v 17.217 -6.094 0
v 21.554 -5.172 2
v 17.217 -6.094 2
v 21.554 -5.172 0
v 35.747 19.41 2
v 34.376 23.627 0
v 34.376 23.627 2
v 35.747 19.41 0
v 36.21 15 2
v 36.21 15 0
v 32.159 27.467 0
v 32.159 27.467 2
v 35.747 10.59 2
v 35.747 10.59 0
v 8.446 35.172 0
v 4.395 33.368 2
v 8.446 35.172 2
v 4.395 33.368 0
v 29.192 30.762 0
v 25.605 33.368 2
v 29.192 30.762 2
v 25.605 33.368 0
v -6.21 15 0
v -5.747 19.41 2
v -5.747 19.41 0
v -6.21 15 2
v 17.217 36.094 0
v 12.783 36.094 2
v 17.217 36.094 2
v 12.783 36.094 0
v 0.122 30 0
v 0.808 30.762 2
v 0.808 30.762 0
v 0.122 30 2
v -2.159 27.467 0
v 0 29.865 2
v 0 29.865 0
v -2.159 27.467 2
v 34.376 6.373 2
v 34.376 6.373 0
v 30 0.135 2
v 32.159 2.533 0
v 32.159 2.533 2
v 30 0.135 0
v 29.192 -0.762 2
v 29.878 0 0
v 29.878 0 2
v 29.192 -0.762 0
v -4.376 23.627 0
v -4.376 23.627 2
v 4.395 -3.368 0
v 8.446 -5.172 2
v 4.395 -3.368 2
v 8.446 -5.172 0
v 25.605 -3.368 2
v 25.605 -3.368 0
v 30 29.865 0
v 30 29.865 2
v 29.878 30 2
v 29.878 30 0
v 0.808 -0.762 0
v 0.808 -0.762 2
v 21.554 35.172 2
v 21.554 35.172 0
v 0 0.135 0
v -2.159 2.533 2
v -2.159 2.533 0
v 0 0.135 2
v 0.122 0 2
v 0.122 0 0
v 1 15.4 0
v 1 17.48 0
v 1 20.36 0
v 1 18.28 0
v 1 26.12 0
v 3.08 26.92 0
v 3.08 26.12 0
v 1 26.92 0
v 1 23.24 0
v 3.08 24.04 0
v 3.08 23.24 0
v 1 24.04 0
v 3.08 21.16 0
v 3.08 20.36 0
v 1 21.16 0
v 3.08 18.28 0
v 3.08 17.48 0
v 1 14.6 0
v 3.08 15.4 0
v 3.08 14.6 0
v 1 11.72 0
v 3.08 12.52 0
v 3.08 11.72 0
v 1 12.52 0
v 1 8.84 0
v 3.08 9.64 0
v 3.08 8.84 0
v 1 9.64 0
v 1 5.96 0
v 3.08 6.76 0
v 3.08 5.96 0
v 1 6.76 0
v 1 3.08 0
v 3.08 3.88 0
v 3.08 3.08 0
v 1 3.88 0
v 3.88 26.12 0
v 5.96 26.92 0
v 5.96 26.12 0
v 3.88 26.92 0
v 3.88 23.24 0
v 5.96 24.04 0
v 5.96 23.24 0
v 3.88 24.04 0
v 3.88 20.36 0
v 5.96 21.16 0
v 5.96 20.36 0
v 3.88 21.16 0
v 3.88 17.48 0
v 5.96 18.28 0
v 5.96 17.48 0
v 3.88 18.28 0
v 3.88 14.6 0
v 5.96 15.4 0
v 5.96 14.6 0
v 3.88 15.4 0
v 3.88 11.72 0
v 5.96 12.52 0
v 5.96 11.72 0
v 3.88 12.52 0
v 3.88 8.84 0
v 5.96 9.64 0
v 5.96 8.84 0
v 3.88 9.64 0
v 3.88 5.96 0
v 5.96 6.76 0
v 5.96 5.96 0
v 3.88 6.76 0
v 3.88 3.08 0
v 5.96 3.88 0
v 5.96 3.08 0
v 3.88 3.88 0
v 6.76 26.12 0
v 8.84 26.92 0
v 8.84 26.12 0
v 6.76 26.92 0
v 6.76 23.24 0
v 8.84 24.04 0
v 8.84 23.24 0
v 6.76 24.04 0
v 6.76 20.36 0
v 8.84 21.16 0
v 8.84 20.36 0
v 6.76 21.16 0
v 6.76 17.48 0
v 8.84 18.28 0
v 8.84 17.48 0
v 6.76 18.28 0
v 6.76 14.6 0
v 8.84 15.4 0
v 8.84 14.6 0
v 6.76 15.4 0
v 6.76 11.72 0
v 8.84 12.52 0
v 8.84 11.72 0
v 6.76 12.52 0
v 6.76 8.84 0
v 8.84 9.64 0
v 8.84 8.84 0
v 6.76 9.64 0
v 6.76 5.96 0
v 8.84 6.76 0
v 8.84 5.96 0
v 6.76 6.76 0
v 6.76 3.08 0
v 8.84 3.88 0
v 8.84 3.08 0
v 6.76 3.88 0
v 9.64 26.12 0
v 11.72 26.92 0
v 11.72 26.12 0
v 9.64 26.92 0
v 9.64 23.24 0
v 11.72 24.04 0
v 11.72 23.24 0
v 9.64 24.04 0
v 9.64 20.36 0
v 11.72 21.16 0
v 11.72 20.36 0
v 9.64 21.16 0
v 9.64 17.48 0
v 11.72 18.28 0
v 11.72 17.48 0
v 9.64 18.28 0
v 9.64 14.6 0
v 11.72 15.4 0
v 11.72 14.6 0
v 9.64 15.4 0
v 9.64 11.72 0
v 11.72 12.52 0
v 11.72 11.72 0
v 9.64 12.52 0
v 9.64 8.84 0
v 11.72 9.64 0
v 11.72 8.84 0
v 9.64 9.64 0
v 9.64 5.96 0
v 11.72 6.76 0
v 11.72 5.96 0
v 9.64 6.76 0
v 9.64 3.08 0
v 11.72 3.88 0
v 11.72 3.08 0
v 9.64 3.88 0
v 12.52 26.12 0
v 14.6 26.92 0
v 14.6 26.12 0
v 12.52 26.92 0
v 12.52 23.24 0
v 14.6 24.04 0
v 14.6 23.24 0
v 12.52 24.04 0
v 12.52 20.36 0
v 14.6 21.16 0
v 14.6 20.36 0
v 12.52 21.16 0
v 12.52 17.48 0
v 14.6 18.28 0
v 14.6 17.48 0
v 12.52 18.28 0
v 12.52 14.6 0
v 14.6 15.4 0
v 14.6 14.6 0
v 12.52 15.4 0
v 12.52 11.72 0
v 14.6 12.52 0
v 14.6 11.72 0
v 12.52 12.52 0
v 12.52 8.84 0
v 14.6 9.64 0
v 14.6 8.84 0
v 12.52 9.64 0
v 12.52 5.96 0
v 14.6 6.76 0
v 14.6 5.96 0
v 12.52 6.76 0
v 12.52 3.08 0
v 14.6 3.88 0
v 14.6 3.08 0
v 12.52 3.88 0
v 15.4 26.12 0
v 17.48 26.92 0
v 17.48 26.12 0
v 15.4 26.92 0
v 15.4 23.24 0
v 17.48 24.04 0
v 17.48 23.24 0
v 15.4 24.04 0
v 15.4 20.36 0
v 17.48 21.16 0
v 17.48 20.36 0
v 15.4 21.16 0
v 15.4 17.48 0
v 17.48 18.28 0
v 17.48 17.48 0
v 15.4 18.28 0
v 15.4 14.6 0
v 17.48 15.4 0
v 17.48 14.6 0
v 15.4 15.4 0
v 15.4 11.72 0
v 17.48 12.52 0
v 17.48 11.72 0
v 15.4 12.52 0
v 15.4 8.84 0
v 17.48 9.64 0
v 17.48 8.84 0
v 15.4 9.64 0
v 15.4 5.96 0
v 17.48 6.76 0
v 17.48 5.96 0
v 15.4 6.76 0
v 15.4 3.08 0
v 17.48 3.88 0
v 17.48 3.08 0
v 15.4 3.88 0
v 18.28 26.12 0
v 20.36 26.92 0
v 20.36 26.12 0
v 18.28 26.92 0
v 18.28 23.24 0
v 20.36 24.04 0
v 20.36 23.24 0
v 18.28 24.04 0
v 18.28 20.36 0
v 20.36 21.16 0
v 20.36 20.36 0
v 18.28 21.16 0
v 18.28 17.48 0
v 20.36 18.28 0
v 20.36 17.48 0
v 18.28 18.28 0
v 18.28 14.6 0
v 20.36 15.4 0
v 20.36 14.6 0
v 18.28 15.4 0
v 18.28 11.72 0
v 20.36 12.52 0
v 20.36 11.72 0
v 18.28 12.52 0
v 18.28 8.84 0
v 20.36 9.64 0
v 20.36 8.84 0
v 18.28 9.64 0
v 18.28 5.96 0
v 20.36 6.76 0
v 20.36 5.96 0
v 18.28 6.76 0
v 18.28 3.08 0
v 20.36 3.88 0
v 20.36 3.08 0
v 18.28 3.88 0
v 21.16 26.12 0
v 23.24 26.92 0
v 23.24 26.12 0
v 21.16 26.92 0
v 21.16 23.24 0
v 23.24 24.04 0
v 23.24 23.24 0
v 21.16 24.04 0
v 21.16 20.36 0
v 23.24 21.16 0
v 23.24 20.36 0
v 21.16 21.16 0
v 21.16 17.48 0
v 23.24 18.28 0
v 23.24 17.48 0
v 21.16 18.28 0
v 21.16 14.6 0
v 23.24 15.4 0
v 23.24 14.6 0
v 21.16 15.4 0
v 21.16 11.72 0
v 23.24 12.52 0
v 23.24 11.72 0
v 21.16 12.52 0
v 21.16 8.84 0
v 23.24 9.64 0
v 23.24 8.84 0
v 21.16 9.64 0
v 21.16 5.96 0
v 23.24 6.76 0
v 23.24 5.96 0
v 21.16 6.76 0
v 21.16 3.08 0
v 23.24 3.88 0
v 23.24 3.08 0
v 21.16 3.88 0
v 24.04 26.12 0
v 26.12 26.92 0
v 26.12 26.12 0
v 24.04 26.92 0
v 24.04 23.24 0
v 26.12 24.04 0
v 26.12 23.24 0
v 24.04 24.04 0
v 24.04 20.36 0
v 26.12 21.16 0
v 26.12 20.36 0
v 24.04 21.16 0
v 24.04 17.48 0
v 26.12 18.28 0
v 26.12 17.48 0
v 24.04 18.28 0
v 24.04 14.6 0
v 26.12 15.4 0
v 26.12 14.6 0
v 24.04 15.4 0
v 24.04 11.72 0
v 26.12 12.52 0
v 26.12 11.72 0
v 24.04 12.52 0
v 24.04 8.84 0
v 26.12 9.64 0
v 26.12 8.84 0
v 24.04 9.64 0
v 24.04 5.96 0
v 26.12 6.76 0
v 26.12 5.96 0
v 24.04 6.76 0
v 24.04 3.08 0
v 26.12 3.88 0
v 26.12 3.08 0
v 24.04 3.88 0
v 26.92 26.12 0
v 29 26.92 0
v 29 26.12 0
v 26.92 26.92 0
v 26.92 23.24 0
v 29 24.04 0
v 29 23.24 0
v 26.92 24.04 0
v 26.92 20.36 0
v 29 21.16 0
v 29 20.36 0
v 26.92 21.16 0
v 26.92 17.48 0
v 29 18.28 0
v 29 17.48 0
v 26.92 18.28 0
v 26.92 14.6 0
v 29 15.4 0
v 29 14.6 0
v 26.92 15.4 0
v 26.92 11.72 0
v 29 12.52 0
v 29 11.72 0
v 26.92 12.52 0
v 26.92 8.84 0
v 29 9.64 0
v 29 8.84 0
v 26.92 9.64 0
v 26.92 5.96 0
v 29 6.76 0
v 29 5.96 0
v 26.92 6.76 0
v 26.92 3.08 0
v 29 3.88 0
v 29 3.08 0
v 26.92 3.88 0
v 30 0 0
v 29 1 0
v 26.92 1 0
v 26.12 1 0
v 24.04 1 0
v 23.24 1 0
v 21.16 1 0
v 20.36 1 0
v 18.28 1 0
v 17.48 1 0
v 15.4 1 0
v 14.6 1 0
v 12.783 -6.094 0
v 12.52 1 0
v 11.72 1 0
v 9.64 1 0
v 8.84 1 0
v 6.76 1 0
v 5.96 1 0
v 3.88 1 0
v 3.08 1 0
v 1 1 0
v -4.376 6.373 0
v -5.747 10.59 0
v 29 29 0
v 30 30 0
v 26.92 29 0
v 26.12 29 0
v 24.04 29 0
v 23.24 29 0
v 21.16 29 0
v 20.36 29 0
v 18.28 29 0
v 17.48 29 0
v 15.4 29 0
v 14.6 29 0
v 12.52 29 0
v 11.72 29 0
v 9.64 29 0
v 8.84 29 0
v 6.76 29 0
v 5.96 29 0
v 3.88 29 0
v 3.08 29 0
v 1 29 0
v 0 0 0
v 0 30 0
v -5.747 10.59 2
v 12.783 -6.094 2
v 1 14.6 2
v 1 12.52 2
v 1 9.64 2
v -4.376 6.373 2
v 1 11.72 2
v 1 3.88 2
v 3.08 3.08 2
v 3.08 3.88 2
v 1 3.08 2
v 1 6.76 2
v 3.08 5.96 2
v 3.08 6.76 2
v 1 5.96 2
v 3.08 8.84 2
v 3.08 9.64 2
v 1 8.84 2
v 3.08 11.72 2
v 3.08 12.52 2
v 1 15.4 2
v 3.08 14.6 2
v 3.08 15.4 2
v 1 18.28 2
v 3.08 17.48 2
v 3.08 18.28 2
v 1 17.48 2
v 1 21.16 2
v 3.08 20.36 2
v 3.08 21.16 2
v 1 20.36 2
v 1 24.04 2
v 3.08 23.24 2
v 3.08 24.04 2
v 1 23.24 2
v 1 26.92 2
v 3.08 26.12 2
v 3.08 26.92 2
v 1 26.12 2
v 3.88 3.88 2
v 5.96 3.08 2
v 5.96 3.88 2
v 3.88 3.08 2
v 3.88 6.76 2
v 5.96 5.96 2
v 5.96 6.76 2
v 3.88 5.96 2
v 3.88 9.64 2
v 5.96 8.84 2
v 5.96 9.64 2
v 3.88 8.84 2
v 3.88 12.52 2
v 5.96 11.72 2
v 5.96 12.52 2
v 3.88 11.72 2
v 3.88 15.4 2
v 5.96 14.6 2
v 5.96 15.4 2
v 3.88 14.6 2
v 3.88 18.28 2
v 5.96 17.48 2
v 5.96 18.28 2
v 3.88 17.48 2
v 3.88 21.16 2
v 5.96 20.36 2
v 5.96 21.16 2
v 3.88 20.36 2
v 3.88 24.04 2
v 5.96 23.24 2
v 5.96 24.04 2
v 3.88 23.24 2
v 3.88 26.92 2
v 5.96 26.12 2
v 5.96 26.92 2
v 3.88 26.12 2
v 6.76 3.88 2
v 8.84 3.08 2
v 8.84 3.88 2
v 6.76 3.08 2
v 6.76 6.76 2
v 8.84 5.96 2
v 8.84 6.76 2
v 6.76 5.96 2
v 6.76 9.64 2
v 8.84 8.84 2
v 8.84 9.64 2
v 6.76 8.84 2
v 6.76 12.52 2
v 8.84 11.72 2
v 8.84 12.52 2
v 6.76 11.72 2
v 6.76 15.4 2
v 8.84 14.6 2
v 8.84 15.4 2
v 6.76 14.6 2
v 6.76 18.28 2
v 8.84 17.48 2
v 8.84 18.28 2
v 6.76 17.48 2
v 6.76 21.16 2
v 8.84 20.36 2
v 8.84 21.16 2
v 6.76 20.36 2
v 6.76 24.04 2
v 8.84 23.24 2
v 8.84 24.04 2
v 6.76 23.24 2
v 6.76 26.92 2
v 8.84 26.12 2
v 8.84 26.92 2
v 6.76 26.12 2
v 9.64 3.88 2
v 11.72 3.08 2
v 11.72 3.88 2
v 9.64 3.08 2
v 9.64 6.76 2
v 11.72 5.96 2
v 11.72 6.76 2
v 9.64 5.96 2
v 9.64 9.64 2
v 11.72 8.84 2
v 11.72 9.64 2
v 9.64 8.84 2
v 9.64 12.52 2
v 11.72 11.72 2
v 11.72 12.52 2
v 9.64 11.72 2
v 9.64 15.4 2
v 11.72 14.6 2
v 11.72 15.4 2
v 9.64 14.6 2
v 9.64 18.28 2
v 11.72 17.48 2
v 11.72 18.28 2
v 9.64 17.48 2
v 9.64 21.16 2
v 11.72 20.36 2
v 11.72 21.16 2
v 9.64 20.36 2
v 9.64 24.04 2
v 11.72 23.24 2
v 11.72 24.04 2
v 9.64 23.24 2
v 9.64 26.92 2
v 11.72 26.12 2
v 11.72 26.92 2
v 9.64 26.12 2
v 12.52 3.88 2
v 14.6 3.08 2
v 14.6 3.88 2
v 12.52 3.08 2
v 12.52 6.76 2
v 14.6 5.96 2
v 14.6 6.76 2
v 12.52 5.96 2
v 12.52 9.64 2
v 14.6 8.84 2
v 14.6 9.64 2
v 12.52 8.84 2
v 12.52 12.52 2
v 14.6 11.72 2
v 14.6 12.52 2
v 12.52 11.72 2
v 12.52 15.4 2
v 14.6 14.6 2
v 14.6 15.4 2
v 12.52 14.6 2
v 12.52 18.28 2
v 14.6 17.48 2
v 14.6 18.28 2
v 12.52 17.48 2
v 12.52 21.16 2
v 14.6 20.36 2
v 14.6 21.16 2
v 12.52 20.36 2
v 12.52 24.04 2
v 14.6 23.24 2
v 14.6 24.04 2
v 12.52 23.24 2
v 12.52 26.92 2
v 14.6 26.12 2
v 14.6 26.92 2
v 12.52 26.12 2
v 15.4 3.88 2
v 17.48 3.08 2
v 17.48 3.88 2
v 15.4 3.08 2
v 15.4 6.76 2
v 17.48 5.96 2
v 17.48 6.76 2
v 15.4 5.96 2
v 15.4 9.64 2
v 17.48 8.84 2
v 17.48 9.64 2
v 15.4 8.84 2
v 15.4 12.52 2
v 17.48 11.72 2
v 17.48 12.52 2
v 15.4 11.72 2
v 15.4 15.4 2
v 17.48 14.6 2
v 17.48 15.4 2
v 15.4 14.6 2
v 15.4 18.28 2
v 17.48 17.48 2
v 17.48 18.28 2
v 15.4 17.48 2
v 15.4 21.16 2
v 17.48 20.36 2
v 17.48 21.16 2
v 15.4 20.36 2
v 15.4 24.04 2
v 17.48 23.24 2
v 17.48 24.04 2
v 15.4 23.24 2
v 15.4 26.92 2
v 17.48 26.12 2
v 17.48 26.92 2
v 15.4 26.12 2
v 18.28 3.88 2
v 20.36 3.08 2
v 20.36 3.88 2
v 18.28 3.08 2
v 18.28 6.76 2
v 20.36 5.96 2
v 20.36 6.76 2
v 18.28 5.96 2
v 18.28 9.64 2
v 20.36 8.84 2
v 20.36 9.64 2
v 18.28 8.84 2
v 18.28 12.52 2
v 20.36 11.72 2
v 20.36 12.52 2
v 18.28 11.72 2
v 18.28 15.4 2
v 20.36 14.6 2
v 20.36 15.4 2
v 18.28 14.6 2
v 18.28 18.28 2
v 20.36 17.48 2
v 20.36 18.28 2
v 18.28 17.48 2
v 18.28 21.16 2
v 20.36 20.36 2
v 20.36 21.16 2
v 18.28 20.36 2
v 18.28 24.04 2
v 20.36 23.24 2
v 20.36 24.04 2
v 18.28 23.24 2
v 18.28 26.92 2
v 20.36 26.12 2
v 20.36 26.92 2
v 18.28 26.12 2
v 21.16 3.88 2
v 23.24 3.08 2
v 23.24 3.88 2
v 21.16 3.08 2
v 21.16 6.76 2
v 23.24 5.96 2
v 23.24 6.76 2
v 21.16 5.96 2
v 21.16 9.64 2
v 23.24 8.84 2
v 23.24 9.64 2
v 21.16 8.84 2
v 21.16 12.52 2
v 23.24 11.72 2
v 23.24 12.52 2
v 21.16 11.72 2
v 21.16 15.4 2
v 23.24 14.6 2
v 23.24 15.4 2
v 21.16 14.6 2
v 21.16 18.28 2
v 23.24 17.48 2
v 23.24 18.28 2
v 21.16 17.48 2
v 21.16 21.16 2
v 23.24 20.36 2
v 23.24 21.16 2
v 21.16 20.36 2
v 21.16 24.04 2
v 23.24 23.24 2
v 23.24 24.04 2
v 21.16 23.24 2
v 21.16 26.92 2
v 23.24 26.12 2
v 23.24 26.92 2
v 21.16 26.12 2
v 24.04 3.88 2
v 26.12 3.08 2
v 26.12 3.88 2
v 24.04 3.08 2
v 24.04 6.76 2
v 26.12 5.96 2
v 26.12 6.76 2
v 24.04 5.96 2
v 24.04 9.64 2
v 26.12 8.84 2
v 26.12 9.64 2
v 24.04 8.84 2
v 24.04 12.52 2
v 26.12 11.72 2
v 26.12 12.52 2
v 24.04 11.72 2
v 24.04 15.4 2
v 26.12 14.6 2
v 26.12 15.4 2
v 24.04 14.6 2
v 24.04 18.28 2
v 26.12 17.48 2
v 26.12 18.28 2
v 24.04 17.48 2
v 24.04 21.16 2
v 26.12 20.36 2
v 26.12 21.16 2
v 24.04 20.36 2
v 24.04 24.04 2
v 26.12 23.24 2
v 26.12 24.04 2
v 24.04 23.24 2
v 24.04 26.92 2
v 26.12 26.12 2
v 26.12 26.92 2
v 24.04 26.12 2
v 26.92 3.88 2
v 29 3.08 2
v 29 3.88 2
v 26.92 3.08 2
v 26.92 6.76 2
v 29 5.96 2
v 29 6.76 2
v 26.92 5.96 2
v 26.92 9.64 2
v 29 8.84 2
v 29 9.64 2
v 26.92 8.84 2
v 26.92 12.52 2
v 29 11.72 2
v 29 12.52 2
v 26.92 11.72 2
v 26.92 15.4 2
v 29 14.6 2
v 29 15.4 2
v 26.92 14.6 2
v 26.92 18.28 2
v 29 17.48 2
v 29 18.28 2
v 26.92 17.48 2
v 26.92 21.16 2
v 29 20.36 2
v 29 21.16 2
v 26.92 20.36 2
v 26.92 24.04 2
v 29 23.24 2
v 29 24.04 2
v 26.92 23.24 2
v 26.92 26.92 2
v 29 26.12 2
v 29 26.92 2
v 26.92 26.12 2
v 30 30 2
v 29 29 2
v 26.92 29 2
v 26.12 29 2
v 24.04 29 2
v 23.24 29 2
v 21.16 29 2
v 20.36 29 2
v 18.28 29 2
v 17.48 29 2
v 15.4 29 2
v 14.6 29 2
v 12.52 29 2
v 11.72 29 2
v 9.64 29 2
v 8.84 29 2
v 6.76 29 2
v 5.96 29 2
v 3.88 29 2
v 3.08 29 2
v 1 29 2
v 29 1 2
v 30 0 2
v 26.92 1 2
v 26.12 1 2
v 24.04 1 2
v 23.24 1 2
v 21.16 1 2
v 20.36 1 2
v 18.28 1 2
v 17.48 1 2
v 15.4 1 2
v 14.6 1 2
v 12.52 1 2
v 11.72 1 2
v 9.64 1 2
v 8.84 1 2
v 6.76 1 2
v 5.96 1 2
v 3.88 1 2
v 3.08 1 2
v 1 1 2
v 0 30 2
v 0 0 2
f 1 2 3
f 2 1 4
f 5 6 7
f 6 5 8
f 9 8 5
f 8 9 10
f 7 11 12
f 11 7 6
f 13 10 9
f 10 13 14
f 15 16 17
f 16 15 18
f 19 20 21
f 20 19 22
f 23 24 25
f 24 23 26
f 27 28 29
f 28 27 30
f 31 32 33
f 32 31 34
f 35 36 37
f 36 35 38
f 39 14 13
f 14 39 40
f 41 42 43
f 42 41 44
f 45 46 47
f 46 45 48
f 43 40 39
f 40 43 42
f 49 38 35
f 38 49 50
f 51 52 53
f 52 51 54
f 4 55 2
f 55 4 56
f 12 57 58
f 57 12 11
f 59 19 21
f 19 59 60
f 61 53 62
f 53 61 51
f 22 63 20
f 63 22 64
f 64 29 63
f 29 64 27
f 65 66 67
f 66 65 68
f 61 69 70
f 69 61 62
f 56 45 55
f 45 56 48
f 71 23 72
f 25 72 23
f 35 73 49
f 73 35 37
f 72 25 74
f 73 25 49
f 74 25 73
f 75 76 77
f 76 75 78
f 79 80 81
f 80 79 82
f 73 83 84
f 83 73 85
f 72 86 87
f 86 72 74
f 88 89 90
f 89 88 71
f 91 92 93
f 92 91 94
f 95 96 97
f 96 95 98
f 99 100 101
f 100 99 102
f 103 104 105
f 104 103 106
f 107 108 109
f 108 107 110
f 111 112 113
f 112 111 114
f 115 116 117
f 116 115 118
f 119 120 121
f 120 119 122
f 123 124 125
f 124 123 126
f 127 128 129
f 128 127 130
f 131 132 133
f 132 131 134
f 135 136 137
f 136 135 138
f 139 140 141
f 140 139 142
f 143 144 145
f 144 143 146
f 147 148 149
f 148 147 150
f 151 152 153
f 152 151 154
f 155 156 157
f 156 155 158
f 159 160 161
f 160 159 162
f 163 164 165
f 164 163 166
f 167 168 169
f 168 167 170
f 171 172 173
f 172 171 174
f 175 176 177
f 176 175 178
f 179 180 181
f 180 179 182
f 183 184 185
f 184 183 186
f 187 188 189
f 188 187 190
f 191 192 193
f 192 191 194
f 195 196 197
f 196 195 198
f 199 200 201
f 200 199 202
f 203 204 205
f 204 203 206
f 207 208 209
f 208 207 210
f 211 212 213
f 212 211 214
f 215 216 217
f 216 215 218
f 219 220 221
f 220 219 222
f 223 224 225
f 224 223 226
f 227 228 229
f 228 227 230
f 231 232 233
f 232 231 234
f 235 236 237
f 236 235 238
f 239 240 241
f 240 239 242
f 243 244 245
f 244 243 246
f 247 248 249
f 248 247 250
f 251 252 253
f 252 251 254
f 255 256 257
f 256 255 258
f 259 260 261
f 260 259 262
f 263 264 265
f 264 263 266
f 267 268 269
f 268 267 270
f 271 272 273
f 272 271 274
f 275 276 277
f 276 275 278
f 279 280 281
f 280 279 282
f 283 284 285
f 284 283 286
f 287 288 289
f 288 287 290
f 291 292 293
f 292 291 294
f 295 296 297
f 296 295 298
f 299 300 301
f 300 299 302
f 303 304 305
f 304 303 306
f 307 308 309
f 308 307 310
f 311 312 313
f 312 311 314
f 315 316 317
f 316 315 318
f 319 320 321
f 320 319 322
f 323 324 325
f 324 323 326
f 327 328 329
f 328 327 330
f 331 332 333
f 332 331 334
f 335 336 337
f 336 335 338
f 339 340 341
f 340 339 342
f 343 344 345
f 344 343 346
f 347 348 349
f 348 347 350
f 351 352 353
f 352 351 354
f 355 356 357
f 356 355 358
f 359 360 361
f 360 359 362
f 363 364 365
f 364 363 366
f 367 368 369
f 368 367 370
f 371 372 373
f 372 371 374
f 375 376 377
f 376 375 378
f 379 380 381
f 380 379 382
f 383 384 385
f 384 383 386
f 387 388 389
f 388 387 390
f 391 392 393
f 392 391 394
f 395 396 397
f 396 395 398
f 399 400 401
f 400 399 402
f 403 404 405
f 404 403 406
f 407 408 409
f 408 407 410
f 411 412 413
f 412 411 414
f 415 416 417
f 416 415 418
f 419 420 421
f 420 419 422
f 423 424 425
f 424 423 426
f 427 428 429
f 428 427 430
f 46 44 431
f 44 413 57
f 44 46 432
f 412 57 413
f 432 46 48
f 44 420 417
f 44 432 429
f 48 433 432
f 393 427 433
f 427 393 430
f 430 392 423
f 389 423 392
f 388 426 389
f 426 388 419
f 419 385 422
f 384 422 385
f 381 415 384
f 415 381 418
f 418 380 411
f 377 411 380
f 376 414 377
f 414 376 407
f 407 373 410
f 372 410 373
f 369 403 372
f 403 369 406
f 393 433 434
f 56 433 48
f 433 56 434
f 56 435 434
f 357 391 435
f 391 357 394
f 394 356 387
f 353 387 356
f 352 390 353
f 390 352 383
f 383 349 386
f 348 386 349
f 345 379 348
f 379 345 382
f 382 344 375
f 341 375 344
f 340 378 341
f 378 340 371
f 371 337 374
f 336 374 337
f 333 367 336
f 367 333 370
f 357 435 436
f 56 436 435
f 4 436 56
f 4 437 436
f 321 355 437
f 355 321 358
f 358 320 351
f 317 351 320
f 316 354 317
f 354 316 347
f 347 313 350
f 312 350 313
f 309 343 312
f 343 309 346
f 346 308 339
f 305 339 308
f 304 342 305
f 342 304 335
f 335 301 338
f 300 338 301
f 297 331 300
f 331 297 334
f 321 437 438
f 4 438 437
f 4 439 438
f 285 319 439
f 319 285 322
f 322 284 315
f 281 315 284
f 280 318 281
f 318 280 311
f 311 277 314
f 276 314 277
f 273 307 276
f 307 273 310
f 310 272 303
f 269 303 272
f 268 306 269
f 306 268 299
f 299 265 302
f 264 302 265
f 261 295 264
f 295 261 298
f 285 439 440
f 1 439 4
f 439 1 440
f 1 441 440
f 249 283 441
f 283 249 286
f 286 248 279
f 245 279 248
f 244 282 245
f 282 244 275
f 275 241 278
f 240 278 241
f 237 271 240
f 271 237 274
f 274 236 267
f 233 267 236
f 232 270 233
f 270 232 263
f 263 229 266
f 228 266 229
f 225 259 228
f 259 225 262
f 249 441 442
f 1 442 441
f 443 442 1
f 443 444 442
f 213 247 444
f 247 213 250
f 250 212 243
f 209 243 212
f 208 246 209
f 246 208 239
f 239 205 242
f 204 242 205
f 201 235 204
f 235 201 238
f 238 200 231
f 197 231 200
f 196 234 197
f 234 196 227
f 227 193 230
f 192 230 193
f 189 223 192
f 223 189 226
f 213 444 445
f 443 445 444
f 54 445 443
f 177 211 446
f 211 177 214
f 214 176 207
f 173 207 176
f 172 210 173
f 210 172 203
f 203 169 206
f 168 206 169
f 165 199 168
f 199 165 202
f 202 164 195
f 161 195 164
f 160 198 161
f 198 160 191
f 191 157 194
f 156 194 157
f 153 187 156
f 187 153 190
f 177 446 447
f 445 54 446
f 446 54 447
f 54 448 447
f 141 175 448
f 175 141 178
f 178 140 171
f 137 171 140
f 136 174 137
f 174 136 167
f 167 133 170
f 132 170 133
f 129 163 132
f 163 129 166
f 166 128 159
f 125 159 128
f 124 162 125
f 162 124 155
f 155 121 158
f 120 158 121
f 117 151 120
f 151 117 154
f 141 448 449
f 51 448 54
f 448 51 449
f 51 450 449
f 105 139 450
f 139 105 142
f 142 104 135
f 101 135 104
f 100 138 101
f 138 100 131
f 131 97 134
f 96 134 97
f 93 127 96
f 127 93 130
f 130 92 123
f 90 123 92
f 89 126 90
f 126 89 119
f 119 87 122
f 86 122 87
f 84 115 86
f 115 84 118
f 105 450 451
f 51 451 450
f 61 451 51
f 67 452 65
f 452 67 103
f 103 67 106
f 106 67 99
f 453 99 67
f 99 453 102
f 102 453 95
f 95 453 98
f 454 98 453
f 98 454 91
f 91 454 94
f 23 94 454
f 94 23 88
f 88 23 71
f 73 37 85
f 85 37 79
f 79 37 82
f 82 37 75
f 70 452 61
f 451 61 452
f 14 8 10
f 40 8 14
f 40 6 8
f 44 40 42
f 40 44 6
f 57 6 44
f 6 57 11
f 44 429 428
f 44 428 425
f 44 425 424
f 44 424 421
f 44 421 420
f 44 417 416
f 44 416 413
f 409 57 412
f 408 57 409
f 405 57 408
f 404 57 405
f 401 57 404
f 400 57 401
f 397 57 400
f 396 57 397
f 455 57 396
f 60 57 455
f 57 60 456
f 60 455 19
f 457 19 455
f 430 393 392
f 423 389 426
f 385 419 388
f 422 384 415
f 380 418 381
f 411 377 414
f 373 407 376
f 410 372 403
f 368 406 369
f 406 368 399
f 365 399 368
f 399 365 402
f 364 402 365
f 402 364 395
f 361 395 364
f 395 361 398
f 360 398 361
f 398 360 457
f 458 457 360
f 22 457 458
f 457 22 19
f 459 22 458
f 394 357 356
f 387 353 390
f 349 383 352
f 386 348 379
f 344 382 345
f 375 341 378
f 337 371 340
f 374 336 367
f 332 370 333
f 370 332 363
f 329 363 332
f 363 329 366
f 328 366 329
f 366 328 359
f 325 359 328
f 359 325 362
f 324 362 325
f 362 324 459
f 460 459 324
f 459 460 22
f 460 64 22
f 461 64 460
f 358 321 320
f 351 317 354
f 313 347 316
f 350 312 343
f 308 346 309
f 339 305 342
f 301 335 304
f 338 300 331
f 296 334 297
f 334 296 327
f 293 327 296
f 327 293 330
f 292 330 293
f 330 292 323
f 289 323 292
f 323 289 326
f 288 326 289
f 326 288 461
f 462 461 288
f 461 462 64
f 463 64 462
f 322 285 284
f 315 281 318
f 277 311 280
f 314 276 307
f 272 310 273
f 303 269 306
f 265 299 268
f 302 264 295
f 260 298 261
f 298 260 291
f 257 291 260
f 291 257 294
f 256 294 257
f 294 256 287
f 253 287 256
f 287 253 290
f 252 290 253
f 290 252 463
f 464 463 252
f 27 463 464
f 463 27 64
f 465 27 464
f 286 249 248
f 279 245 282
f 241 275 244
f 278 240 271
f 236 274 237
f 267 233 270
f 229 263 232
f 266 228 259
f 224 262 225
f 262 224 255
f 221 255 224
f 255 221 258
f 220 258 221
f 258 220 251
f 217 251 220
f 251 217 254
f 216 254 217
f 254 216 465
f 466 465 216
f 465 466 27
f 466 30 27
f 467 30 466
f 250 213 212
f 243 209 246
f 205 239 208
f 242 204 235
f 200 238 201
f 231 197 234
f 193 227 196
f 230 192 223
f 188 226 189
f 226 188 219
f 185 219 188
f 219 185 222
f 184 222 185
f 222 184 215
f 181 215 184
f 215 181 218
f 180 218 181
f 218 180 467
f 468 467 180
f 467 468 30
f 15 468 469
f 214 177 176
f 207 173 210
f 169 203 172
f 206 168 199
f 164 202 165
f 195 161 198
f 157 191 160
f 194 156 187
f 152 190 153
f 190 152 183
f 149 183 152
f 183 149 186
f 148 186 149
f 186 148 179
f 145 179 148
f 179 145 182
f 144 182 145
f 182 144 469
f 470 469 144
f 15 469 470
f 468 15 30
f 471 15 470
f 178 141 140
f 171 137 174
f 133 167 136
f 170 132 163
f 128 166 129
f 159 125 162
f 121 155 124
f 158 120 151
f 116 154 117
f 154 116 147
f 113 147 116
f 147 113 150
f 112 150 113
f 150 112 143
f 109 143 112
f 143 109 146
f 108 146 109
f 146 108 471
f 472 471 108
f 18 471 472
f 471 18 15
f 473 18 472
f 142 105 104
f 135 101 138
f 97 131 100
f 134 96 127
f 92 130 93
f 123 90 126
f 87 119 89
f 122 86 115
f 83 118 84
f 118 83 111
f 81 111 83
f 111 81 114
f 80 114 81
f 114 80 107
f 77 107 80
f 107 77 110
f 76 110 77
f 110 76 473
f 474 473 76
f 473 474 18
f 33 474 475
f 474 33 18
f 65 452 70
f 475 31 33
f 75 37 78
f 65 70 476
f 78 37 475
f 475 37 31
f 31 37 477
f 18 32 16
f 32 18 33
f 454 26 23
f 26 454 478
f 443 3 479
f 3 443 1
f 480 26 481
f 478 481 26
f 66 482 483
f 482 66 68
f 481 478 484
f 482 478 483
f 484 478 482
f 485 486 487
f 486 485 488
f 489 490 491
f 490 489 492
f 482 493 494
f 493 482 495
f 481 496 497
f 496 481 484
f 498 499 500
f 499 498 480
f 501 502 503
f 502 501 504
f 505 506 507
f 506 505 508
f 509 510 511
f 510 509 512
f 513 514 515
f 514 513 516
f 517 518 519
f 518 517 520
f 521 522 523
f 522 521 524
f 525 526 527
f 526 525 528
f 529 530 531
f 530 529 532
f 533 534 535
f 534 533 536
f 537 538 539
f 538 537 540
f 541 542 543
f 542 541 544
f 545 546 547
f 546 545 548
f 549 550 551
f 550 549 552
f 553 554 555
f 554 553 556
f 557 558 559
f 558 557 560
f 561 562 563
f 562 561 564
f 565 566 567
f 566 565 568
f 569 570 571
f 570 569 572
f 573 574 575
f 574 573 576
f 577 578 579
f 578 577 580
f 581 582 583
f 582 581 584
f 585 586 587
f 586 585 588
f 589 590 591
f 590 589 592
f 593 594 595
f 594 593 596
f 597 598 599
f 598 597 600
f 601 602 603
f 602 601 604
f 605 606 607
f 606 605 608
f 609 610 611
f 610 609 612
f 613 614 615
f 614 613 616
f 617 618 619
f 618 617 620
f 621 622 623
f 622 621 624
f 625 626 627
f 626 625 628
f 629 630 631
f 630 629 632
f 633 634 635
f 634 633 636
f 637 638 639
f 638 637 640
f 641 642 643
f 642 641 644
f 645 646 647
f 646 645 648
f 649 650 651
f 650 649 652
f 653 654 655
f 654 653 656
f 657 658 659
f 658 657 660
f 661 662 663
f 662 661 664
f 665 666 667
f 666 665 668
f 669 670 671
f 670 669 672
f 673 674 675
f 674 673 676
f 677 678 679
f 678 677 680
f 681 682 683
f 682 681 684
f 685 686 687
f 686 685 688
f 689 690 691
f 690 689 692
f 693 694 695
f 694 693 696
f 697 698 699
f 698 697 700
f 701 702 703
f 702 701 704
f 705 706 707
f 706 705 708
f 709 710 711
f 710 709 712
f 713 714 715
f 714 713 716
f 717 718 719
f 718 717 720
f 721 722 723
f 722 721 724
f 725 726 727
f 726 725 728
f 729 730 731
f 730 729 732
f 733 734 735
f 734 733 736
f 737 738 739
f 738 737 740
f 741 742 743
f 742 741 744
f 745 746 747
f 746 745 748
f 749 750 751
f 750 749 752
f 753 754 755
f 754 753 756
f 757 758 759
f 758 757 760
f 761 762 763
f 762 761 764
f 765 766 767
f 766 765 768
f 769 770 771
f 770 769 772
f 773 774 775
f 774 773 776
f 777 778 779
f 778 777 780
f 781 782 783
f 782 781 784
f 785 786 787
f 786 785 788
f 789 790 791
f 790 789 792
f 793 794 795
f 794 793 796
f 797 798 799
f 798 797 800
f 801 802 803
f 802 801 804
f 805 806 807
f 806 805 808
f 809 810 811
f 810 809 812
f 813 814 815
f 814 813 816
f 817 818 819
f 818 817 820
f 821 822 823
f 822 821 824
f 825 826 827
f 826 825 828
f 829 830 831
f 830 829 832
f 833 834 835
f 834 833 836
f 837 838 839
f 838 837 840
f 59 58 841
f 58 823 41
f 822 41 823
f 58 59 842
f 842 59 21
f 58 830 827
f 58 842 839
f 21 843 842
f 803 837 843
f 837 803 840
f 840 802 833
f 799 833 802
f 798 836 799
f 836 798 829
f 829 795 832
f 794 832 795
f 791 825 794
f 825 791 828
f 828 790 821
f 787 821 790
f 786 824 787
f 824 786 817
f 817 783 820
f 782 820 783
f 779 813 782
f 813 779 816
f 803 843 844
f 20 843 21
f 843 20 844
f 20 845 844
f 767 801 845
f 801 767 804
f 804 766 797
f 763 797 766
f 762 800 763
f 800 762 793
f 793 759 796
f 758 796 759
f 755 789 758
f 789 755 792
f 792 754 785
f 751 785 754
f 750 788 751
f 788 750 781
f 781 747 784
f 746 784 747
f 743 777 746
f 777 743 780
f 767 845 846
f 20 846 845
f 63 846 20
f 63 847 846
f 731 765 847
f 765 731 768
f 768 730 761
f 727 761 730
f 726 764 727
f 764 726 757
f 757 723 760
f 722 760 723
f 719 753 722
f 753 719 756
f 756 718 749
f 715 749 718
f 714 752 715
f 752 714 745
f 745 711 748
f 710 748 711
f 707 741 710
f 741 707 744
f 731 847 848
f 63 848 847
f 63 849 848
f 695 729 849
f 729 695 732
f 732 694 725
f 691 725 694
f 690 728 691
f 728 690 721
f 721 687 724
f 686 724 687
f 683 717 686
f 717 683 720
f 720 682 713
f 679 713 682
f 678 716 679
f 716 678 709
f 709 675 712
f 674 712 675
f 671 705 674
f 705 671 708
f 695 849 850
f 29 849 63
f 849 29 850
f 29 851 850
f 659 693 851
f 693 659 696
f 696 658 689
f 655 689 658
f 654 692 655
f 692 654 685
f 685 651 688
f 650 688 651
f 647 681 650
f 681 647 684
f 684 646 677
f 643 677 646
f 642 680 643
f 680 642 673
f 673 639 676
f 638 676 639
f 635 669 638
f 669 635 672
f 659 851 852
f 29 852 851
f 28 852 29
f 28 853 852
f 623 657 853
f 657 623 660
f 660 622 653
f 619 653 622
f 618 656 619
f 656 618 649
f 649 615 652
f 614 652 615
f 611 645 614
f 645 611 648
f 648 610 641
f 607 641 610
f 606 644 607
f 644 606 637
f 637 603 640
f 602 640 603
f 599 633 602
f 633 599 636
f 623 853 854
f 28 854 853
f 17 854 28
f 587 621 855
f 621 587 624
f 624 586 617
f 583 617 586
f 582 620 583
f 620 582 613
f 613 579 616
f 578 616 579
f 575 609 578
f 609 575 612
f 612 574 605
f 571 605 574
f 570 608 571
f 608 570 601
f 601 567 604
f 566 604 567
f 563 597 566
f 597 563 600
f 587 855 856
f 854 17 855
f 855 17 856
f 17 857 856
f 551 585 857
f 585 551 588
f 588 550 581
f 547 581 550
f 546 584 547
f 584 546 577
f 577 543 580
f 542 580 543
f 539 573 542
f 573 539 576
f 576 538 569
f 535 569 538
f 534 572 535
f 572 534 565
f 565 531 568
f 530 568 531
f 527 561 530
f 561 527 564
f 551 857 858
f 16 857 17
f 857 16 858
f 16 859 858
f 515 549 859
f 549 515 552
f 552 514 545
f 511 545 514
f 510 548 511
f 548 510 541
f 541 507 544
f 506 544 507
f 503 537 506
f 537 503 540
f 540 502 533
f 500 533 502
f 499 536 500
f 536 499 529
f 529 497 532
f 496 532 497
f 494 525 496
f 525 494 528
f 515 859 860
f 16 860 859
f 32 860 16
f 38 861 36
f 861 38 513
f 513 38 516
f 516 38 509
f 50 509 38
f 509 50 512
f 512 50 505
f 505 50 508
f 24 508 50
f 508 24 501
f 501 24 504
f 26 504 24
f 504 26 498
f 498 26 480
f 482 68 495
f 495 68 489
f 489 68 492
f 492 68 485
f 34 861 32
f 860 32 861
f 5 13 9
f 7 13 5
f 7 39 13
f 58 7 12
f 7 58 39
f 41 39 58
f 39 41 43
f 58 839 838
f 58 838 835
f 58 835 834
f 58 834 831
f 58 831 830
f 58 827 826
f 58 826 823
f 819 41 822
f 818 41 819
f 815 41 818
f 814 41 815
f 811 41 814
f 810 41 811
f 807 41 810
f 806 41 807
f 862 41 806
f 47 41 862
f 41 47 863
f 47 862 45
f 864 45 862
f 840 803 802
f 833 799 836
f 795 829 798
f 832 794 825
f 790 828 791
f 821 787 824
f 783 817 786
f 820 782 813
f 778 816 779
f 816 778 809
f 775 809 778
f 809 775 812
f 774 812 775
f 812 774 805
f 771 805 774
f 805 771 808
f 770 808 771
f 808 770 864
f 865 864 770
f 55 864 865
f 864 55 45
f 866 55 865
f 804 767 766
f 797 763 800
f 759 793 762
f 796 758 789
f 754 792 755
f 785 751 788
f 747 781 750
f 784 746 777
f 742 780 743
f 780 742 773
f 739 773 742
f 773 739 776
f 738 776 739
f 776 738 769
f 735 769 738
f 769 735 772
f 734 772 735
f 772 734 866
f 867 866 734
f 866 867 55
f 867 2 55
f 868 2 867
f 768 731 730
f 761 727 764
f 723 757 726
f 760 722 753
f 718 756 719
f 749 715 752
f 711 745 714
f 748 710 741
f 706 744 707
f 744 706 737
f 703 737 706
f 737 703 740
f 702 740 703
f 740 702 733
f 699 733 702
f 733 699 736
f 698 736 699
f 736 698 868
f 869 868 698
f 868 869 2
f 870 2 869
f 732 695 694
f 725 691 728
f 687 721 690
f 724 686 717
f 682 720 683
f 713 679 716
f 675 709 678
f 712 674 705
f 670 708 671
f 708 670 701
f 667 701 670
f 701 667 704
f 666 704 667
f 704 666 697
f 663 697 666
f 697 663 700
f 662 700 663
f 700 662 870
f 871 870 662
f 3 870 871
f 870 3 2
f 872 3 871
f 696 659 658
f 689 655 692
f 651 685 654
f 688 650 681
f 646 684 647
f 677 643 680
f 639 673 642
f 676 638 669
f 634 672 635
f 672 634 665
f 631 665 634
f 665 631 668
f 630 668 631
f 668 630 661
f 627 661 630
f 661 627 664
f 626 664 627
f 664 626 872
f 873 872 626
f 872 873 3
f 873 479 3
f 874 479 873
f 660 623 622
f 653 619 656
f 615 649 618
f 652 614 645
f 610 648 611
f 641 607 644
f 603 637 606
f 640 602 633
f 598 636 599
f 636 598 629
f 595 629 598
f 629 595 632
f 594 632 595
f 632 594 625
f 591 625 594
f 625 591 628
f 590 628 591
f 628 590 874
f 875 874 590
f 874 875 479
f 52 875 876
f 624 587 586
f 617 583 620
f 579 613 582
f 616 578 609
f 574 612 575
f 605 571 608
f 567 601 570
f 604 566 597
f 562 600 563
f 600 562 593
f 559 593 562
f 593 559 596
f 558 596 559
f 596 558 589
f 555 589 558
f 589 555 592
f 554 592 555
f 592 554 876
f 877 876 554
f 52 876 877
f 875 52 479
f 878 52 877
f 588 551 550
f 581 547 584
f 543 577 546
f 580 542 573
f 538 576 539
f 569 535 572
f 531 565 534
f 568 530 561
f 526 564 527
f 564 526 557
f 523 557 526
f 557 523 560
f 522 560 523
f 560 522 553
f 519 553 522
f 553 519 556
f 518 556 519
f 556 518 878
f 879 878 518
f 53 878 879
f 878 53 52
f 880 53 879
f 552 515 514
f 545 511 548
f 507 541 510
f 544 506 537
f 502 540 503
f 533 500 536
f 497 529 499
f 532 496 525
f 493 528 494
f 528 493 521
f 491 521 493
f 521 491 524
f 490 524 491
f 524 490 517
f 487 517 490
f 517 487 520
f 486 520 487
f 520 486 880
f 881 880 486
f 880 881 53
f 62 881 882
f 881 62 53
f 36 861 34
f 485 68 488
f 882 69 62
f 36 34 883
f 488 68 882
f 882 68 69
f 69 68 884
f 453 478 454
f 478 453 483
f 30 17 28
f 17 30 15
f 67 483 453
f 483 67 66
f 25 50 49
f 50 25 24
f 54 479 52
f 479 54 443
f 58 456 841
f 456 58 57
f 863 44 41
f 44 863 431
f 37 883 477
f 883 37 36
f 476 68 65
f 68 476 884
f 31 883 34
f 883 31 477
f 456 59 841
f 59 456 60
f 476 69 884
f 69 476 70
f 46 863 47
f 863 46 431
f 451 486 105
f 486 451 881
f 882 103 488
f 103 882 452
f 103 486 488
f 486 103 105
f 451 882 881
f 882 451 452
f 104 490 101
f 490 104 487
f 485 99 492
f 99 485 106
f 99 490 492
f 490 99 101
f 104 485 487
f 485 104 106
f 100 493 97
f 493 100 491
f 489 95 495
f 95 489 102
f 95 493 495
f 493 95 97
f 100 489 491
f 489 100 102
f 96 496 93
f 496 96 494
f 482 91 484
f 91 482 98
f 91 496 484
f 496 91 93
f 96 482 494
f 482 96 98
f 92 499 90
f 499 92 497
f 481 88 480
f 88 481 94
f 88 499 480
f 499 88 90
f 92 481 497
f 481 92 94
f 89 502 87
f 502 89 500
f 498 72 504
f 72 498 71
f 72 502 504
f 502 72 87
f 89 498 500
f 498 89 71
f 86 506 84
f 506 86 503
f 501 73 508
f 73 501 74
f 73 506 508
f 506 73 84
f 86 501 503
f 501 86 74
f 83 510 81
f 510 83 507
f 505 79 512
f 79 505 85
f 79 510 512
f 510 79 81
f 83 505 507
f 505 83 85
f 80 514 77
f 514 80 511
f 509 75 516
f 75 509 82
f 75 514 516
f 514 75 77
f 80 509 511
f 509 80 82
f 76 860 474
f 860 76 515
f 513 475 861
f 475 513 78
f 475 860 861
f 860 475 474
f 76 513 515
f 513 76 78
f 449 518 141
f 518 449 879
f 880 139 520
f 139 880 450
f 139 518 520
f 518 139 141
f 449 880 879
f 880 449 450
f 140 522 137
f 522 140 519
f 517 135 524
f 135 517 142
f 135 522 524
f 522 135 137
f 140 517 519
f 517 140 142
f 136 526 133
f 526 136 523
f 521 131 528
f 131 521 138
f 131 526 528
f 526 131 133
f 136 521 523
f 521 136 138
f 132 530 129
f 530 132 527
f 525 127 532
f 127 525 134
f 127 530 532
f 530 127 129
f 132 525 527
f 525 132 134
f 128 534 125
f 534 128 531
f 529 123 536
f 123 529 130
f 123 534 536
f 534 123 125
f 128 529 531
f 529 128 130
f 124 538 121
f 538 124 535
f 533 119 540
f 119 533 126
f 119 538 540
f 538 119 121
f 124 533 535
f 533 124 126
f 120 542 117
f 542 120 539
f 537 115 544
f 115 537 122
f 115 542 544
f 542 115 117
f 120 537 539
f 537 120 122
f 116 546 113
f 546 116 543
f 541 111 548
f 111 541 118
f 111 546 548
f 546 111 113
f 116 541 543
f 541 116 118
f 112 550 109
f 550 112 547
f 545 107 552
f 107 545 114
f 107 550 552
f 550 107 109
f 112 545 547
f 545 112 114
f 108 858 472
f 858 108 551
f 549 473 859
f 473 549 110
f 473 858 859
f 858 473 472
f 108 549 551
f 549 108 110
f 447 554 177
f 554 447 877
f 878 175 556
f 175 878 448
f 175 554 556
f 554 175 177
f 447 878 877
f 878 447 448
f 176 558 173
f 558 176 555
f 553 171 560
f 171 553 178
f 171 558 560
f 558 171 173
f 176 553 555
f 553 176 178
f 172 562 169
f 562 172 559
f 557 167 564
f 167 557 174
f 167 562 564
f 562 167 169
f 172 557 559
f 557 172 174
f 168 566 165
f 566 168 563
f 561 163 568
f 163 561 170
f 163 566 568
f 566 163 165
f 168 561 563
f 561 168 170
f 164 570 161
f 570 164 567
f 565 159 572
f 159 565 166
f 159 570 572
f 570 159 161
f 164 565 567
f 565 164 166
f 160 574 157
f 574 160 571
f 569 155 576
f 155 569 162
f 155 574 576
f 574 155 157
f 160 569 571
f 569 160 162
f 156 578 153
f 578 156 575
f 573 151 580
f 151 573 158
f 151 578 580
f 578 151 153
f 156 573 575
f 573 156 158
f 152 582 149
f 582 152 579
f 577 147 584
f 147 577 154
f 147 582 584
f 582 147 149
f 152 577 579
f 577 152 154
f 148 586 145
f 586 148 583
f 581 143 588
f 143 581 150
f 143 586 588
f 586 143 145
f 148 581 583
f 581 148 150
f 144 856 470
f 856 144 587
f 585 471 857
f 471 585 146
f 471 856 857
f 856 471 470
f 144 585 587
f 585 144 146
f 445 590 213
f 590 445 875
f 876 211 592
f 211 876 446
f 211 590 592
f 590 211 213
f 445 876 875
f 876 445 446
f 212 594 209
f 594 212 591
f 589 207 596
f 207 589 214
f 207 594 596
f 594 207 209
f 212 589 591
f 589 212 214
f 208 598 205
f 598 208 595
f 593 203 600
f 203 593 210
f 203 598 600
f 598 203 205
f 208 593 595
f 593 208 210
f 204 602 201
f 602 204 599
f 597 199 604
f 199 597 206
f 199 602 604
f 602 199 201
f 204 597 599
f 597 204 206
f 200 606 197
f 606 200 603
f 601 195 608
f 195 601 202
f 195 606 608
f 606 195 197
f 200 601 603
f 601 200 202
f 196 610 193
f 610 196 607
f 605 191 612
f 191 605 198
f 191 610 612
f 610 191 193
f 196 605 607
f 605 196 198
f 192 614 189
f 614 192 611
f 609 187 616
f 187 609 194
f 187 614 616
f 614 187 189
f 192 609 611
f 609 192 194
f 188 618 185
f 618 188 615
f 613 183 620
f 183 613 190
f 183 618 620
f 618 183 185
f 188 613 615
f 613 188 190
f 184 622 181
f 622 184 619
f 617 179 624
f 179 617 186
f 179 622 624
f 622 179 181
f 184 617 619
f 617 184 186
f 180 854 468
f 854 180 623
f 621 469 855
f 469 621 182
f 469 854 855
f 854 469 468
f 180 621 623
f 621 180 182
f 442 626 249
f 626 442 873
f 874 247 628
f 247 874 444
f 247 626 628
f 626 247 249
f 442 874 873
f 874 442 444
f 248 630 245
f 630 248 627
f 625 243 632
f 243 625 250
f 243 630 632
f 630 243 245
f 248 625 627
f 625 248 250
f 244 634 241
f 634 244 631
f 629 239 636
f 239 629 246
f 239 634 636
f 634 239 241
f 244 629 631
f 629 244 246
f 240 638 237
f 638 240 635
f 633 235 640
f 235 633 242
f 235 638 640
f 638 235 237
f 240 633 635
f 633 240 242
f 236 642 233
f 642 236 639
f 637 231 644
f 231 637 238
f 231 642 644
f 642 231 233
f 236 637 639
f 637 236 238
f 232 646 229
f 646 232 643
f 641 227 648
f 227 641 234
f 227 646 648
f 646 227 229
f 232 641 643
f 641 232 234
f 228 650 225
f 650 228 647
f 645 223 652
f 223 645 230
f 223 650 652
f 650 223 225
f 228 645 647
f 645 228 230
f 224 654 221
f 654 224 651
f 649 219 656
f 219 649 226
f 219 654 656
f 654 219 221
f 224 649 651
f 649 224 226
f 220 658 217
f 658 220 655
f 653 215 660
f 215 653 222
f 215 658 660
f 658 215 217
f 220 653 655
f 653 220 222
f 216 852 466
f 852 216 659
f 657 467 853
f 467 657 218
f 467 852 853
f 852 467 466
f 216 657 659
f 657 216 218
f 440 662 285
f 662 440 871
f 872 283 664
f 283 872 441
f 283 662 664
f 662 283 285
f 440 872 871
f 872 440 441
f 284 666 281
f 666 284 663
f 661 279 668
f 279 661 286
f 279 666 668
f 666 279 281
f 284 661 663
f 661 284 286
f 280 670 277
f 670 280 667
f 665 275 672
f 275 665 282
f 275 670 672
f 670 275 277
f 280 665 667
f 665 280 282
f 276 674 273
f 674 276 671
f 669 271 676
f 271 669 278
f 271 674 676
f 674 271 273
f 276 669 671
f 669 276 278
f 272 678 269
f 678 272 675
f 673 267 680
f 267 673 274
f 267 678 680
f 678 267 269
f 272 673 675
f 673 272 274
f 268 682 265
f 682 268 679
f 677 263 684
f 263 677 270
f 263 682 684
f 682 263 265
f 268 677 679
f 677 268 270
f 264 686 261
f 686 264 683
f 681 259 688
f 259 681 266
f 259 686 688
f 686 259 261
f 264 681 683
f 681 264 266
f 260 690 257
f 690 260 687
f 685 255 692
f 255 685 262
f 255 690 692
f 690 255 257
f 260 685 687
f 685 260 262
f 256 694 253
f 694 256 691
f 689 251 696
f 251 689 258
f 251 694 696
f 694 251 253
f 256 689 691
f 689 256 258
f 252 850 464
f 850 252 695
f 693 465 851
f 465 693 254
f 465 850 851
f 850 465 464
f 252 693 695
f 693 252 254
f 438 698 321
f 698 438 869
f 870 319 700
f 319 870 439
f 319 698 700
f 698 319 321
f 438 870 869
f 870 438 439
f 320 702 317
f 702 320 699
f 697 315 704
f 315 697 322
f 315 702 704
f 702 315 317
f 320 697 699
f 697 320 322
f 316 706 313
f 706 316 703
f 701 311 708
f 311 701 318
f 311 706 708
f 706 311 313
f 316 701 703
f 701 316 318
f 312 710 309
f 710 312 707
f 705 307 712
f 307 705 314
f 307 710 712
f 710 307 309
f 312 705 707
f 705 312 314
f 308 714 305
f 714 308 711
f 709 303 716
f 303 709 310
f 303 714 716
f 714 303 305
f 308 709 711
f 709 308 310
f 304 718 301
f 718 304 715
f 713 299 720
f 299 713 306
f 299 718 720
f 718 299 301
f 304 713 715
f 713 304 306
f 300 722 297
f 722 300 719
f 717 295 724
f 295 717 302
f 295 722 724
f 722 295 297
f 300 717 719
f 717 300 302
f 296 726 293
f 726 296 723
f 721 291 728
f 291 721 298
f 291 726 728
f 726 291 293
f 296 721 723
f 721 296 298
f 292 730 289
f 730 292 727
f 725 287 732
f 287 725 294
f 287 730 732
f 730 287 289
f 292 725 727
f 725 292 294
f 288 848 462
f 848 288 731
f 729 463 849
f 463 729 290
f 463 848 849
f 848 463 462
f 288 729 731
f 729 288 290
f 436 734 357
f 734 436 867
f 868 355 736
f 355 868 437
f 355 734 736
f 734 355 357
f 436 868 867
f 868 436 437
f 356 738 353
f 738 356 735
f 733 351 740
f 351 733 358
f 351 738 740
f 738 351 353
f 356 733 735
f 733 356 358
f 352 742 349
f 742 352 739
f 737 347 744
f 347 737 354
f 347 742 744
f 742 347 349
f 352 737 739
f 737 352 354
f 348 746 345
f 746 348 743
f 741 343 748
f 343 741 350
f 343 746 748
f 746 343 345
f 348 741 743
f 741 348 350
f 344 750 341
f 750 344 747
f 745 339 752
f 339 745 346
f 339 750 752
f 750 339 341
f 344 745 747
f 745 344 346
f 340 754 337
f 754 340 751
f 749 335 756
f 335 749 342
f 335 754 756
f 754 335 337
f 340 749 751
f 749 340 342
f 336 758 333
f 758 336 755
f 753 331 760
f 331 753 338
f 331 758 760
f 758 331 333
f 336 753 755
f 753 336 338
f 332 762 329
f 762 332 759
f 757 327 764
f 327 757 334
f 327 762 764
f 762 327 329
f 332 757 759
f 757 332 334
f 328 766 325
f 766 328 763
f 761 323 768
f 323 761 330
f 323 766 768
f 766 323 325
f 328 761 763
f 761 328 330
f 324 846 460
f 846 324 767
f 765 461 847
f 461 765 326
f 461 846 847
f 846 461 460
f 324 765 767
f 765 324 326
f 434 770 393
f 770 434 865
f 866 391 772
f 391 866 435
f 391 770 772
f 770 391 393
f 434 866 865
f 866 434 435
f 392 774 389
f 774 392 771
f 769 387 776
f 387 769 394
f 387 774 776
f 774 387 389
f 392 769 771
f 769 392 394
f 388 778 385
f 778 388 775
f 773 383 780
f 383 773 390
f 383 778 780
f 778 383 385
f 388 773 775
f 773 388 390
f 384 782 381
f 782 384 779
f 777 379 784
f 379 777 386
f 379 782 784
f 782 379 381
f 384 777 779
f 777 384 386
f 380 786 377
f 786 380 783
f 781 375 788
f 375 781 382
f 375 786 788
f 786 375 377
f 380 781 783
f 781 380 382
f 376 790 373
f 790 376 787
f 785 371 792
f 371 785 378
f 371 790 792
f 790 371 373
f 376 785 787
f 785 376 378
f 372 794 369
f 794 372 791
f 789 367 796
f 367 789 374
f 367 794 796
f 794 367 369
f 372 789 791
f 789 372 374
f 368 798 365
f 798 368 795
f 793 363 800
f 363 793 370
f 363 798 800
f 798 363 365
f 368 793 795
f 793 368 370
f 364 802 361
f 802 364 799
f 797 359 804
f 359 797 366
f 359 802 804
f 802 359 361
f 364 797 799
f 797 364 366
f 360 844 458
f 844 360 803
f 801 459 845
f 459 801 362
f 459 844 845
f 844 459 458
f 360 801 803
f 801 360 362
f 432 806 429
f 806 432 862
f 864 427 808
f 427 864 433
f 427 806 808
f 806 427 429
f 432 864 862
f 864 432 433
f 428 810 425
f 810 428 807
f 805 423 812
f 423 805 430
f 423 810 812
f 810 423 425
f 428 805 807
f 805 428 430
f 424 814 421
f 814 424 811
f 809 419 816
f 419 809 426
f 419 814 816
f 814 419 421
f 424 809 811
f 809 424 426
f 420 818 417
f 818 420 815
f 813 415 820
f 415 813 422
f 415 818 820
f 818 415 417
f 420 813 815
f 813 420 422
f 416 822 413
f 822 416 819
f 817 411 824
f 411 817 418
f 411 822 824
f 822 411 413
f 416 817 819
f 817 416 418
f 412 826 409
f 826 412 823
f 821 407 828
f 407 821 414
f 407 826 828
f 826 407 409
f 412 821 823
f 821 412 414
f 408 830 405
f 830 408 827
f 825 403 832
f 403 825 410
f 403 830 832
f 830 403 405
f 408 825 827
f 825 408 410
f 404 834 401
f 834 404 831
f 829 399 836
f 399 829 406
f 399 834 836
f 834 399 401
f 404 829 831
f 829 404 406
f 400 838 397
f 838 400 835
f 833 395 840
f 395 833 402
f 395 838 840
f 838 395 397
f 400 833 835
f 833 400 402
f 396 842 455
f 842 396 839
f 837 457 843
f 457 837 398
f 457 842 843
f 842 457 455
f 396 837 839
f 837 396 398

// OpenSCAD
// Grid
// By Dana Woodman <dana@danawoodman.com>


// Settings
//--------------------------

/* [Global] */

// The width of the exported file.
width = 30;

// The height of the exported file.
height = 30;

// The number of columns to generate.
cols = 10;

// The number of rows to generate.
rows = 10;

// The border around the grids/slats
border = 1;

// The spacing between rows/columns.
spacing = .8;

//thickness
thickness = 2;

/* [Hidden] */

// The magic...
//--------------------------

// Calculated inner width of dispaly area.
innerWidth = (width - (2 * border));
innerHeight = (height - (2 * border));
//echo("innerWidth", innerWidth, "innerHeight", innerHeight);

// Calculate size of the squares.
function dimension(size, divisions) = (size - ((divisions - 1) * spacing)) / divisions;
xWidth = dimension(innerWidth, cols);
yWidth = dimension(innerHeight, rows);
//echo("xWidth", xWidth, "yWidth", yWidth);

function calculate_location(size, index, spacing) = (size + spacing) * index;

eps=.001;
// Subtract the squares from the display area.
difference() {

	// The display area.
    union()
    {
        translate([width/2,height/2,0])
        cylinder(r=1.414*max(width,height)/2,h=thickness);
        cube(size=[width, height,thickness]);
    }
	// Offset by border size.
	translate([border, border,-eps])

		// Iterate over all the columns.
		for (col = [0 : cols - 1]) {
			
			// Iterate over all the rows.
			for (row = [0 : rows - 1]) {

				// Caclulate position of each square
				translate([
					calculate_location(xWidth, col, spacing), 
					calculate_location(yWidth, row, spacing)
				])
					cube(size=[xWidth, yWidth,2*thickness]);
			}
		}
}
